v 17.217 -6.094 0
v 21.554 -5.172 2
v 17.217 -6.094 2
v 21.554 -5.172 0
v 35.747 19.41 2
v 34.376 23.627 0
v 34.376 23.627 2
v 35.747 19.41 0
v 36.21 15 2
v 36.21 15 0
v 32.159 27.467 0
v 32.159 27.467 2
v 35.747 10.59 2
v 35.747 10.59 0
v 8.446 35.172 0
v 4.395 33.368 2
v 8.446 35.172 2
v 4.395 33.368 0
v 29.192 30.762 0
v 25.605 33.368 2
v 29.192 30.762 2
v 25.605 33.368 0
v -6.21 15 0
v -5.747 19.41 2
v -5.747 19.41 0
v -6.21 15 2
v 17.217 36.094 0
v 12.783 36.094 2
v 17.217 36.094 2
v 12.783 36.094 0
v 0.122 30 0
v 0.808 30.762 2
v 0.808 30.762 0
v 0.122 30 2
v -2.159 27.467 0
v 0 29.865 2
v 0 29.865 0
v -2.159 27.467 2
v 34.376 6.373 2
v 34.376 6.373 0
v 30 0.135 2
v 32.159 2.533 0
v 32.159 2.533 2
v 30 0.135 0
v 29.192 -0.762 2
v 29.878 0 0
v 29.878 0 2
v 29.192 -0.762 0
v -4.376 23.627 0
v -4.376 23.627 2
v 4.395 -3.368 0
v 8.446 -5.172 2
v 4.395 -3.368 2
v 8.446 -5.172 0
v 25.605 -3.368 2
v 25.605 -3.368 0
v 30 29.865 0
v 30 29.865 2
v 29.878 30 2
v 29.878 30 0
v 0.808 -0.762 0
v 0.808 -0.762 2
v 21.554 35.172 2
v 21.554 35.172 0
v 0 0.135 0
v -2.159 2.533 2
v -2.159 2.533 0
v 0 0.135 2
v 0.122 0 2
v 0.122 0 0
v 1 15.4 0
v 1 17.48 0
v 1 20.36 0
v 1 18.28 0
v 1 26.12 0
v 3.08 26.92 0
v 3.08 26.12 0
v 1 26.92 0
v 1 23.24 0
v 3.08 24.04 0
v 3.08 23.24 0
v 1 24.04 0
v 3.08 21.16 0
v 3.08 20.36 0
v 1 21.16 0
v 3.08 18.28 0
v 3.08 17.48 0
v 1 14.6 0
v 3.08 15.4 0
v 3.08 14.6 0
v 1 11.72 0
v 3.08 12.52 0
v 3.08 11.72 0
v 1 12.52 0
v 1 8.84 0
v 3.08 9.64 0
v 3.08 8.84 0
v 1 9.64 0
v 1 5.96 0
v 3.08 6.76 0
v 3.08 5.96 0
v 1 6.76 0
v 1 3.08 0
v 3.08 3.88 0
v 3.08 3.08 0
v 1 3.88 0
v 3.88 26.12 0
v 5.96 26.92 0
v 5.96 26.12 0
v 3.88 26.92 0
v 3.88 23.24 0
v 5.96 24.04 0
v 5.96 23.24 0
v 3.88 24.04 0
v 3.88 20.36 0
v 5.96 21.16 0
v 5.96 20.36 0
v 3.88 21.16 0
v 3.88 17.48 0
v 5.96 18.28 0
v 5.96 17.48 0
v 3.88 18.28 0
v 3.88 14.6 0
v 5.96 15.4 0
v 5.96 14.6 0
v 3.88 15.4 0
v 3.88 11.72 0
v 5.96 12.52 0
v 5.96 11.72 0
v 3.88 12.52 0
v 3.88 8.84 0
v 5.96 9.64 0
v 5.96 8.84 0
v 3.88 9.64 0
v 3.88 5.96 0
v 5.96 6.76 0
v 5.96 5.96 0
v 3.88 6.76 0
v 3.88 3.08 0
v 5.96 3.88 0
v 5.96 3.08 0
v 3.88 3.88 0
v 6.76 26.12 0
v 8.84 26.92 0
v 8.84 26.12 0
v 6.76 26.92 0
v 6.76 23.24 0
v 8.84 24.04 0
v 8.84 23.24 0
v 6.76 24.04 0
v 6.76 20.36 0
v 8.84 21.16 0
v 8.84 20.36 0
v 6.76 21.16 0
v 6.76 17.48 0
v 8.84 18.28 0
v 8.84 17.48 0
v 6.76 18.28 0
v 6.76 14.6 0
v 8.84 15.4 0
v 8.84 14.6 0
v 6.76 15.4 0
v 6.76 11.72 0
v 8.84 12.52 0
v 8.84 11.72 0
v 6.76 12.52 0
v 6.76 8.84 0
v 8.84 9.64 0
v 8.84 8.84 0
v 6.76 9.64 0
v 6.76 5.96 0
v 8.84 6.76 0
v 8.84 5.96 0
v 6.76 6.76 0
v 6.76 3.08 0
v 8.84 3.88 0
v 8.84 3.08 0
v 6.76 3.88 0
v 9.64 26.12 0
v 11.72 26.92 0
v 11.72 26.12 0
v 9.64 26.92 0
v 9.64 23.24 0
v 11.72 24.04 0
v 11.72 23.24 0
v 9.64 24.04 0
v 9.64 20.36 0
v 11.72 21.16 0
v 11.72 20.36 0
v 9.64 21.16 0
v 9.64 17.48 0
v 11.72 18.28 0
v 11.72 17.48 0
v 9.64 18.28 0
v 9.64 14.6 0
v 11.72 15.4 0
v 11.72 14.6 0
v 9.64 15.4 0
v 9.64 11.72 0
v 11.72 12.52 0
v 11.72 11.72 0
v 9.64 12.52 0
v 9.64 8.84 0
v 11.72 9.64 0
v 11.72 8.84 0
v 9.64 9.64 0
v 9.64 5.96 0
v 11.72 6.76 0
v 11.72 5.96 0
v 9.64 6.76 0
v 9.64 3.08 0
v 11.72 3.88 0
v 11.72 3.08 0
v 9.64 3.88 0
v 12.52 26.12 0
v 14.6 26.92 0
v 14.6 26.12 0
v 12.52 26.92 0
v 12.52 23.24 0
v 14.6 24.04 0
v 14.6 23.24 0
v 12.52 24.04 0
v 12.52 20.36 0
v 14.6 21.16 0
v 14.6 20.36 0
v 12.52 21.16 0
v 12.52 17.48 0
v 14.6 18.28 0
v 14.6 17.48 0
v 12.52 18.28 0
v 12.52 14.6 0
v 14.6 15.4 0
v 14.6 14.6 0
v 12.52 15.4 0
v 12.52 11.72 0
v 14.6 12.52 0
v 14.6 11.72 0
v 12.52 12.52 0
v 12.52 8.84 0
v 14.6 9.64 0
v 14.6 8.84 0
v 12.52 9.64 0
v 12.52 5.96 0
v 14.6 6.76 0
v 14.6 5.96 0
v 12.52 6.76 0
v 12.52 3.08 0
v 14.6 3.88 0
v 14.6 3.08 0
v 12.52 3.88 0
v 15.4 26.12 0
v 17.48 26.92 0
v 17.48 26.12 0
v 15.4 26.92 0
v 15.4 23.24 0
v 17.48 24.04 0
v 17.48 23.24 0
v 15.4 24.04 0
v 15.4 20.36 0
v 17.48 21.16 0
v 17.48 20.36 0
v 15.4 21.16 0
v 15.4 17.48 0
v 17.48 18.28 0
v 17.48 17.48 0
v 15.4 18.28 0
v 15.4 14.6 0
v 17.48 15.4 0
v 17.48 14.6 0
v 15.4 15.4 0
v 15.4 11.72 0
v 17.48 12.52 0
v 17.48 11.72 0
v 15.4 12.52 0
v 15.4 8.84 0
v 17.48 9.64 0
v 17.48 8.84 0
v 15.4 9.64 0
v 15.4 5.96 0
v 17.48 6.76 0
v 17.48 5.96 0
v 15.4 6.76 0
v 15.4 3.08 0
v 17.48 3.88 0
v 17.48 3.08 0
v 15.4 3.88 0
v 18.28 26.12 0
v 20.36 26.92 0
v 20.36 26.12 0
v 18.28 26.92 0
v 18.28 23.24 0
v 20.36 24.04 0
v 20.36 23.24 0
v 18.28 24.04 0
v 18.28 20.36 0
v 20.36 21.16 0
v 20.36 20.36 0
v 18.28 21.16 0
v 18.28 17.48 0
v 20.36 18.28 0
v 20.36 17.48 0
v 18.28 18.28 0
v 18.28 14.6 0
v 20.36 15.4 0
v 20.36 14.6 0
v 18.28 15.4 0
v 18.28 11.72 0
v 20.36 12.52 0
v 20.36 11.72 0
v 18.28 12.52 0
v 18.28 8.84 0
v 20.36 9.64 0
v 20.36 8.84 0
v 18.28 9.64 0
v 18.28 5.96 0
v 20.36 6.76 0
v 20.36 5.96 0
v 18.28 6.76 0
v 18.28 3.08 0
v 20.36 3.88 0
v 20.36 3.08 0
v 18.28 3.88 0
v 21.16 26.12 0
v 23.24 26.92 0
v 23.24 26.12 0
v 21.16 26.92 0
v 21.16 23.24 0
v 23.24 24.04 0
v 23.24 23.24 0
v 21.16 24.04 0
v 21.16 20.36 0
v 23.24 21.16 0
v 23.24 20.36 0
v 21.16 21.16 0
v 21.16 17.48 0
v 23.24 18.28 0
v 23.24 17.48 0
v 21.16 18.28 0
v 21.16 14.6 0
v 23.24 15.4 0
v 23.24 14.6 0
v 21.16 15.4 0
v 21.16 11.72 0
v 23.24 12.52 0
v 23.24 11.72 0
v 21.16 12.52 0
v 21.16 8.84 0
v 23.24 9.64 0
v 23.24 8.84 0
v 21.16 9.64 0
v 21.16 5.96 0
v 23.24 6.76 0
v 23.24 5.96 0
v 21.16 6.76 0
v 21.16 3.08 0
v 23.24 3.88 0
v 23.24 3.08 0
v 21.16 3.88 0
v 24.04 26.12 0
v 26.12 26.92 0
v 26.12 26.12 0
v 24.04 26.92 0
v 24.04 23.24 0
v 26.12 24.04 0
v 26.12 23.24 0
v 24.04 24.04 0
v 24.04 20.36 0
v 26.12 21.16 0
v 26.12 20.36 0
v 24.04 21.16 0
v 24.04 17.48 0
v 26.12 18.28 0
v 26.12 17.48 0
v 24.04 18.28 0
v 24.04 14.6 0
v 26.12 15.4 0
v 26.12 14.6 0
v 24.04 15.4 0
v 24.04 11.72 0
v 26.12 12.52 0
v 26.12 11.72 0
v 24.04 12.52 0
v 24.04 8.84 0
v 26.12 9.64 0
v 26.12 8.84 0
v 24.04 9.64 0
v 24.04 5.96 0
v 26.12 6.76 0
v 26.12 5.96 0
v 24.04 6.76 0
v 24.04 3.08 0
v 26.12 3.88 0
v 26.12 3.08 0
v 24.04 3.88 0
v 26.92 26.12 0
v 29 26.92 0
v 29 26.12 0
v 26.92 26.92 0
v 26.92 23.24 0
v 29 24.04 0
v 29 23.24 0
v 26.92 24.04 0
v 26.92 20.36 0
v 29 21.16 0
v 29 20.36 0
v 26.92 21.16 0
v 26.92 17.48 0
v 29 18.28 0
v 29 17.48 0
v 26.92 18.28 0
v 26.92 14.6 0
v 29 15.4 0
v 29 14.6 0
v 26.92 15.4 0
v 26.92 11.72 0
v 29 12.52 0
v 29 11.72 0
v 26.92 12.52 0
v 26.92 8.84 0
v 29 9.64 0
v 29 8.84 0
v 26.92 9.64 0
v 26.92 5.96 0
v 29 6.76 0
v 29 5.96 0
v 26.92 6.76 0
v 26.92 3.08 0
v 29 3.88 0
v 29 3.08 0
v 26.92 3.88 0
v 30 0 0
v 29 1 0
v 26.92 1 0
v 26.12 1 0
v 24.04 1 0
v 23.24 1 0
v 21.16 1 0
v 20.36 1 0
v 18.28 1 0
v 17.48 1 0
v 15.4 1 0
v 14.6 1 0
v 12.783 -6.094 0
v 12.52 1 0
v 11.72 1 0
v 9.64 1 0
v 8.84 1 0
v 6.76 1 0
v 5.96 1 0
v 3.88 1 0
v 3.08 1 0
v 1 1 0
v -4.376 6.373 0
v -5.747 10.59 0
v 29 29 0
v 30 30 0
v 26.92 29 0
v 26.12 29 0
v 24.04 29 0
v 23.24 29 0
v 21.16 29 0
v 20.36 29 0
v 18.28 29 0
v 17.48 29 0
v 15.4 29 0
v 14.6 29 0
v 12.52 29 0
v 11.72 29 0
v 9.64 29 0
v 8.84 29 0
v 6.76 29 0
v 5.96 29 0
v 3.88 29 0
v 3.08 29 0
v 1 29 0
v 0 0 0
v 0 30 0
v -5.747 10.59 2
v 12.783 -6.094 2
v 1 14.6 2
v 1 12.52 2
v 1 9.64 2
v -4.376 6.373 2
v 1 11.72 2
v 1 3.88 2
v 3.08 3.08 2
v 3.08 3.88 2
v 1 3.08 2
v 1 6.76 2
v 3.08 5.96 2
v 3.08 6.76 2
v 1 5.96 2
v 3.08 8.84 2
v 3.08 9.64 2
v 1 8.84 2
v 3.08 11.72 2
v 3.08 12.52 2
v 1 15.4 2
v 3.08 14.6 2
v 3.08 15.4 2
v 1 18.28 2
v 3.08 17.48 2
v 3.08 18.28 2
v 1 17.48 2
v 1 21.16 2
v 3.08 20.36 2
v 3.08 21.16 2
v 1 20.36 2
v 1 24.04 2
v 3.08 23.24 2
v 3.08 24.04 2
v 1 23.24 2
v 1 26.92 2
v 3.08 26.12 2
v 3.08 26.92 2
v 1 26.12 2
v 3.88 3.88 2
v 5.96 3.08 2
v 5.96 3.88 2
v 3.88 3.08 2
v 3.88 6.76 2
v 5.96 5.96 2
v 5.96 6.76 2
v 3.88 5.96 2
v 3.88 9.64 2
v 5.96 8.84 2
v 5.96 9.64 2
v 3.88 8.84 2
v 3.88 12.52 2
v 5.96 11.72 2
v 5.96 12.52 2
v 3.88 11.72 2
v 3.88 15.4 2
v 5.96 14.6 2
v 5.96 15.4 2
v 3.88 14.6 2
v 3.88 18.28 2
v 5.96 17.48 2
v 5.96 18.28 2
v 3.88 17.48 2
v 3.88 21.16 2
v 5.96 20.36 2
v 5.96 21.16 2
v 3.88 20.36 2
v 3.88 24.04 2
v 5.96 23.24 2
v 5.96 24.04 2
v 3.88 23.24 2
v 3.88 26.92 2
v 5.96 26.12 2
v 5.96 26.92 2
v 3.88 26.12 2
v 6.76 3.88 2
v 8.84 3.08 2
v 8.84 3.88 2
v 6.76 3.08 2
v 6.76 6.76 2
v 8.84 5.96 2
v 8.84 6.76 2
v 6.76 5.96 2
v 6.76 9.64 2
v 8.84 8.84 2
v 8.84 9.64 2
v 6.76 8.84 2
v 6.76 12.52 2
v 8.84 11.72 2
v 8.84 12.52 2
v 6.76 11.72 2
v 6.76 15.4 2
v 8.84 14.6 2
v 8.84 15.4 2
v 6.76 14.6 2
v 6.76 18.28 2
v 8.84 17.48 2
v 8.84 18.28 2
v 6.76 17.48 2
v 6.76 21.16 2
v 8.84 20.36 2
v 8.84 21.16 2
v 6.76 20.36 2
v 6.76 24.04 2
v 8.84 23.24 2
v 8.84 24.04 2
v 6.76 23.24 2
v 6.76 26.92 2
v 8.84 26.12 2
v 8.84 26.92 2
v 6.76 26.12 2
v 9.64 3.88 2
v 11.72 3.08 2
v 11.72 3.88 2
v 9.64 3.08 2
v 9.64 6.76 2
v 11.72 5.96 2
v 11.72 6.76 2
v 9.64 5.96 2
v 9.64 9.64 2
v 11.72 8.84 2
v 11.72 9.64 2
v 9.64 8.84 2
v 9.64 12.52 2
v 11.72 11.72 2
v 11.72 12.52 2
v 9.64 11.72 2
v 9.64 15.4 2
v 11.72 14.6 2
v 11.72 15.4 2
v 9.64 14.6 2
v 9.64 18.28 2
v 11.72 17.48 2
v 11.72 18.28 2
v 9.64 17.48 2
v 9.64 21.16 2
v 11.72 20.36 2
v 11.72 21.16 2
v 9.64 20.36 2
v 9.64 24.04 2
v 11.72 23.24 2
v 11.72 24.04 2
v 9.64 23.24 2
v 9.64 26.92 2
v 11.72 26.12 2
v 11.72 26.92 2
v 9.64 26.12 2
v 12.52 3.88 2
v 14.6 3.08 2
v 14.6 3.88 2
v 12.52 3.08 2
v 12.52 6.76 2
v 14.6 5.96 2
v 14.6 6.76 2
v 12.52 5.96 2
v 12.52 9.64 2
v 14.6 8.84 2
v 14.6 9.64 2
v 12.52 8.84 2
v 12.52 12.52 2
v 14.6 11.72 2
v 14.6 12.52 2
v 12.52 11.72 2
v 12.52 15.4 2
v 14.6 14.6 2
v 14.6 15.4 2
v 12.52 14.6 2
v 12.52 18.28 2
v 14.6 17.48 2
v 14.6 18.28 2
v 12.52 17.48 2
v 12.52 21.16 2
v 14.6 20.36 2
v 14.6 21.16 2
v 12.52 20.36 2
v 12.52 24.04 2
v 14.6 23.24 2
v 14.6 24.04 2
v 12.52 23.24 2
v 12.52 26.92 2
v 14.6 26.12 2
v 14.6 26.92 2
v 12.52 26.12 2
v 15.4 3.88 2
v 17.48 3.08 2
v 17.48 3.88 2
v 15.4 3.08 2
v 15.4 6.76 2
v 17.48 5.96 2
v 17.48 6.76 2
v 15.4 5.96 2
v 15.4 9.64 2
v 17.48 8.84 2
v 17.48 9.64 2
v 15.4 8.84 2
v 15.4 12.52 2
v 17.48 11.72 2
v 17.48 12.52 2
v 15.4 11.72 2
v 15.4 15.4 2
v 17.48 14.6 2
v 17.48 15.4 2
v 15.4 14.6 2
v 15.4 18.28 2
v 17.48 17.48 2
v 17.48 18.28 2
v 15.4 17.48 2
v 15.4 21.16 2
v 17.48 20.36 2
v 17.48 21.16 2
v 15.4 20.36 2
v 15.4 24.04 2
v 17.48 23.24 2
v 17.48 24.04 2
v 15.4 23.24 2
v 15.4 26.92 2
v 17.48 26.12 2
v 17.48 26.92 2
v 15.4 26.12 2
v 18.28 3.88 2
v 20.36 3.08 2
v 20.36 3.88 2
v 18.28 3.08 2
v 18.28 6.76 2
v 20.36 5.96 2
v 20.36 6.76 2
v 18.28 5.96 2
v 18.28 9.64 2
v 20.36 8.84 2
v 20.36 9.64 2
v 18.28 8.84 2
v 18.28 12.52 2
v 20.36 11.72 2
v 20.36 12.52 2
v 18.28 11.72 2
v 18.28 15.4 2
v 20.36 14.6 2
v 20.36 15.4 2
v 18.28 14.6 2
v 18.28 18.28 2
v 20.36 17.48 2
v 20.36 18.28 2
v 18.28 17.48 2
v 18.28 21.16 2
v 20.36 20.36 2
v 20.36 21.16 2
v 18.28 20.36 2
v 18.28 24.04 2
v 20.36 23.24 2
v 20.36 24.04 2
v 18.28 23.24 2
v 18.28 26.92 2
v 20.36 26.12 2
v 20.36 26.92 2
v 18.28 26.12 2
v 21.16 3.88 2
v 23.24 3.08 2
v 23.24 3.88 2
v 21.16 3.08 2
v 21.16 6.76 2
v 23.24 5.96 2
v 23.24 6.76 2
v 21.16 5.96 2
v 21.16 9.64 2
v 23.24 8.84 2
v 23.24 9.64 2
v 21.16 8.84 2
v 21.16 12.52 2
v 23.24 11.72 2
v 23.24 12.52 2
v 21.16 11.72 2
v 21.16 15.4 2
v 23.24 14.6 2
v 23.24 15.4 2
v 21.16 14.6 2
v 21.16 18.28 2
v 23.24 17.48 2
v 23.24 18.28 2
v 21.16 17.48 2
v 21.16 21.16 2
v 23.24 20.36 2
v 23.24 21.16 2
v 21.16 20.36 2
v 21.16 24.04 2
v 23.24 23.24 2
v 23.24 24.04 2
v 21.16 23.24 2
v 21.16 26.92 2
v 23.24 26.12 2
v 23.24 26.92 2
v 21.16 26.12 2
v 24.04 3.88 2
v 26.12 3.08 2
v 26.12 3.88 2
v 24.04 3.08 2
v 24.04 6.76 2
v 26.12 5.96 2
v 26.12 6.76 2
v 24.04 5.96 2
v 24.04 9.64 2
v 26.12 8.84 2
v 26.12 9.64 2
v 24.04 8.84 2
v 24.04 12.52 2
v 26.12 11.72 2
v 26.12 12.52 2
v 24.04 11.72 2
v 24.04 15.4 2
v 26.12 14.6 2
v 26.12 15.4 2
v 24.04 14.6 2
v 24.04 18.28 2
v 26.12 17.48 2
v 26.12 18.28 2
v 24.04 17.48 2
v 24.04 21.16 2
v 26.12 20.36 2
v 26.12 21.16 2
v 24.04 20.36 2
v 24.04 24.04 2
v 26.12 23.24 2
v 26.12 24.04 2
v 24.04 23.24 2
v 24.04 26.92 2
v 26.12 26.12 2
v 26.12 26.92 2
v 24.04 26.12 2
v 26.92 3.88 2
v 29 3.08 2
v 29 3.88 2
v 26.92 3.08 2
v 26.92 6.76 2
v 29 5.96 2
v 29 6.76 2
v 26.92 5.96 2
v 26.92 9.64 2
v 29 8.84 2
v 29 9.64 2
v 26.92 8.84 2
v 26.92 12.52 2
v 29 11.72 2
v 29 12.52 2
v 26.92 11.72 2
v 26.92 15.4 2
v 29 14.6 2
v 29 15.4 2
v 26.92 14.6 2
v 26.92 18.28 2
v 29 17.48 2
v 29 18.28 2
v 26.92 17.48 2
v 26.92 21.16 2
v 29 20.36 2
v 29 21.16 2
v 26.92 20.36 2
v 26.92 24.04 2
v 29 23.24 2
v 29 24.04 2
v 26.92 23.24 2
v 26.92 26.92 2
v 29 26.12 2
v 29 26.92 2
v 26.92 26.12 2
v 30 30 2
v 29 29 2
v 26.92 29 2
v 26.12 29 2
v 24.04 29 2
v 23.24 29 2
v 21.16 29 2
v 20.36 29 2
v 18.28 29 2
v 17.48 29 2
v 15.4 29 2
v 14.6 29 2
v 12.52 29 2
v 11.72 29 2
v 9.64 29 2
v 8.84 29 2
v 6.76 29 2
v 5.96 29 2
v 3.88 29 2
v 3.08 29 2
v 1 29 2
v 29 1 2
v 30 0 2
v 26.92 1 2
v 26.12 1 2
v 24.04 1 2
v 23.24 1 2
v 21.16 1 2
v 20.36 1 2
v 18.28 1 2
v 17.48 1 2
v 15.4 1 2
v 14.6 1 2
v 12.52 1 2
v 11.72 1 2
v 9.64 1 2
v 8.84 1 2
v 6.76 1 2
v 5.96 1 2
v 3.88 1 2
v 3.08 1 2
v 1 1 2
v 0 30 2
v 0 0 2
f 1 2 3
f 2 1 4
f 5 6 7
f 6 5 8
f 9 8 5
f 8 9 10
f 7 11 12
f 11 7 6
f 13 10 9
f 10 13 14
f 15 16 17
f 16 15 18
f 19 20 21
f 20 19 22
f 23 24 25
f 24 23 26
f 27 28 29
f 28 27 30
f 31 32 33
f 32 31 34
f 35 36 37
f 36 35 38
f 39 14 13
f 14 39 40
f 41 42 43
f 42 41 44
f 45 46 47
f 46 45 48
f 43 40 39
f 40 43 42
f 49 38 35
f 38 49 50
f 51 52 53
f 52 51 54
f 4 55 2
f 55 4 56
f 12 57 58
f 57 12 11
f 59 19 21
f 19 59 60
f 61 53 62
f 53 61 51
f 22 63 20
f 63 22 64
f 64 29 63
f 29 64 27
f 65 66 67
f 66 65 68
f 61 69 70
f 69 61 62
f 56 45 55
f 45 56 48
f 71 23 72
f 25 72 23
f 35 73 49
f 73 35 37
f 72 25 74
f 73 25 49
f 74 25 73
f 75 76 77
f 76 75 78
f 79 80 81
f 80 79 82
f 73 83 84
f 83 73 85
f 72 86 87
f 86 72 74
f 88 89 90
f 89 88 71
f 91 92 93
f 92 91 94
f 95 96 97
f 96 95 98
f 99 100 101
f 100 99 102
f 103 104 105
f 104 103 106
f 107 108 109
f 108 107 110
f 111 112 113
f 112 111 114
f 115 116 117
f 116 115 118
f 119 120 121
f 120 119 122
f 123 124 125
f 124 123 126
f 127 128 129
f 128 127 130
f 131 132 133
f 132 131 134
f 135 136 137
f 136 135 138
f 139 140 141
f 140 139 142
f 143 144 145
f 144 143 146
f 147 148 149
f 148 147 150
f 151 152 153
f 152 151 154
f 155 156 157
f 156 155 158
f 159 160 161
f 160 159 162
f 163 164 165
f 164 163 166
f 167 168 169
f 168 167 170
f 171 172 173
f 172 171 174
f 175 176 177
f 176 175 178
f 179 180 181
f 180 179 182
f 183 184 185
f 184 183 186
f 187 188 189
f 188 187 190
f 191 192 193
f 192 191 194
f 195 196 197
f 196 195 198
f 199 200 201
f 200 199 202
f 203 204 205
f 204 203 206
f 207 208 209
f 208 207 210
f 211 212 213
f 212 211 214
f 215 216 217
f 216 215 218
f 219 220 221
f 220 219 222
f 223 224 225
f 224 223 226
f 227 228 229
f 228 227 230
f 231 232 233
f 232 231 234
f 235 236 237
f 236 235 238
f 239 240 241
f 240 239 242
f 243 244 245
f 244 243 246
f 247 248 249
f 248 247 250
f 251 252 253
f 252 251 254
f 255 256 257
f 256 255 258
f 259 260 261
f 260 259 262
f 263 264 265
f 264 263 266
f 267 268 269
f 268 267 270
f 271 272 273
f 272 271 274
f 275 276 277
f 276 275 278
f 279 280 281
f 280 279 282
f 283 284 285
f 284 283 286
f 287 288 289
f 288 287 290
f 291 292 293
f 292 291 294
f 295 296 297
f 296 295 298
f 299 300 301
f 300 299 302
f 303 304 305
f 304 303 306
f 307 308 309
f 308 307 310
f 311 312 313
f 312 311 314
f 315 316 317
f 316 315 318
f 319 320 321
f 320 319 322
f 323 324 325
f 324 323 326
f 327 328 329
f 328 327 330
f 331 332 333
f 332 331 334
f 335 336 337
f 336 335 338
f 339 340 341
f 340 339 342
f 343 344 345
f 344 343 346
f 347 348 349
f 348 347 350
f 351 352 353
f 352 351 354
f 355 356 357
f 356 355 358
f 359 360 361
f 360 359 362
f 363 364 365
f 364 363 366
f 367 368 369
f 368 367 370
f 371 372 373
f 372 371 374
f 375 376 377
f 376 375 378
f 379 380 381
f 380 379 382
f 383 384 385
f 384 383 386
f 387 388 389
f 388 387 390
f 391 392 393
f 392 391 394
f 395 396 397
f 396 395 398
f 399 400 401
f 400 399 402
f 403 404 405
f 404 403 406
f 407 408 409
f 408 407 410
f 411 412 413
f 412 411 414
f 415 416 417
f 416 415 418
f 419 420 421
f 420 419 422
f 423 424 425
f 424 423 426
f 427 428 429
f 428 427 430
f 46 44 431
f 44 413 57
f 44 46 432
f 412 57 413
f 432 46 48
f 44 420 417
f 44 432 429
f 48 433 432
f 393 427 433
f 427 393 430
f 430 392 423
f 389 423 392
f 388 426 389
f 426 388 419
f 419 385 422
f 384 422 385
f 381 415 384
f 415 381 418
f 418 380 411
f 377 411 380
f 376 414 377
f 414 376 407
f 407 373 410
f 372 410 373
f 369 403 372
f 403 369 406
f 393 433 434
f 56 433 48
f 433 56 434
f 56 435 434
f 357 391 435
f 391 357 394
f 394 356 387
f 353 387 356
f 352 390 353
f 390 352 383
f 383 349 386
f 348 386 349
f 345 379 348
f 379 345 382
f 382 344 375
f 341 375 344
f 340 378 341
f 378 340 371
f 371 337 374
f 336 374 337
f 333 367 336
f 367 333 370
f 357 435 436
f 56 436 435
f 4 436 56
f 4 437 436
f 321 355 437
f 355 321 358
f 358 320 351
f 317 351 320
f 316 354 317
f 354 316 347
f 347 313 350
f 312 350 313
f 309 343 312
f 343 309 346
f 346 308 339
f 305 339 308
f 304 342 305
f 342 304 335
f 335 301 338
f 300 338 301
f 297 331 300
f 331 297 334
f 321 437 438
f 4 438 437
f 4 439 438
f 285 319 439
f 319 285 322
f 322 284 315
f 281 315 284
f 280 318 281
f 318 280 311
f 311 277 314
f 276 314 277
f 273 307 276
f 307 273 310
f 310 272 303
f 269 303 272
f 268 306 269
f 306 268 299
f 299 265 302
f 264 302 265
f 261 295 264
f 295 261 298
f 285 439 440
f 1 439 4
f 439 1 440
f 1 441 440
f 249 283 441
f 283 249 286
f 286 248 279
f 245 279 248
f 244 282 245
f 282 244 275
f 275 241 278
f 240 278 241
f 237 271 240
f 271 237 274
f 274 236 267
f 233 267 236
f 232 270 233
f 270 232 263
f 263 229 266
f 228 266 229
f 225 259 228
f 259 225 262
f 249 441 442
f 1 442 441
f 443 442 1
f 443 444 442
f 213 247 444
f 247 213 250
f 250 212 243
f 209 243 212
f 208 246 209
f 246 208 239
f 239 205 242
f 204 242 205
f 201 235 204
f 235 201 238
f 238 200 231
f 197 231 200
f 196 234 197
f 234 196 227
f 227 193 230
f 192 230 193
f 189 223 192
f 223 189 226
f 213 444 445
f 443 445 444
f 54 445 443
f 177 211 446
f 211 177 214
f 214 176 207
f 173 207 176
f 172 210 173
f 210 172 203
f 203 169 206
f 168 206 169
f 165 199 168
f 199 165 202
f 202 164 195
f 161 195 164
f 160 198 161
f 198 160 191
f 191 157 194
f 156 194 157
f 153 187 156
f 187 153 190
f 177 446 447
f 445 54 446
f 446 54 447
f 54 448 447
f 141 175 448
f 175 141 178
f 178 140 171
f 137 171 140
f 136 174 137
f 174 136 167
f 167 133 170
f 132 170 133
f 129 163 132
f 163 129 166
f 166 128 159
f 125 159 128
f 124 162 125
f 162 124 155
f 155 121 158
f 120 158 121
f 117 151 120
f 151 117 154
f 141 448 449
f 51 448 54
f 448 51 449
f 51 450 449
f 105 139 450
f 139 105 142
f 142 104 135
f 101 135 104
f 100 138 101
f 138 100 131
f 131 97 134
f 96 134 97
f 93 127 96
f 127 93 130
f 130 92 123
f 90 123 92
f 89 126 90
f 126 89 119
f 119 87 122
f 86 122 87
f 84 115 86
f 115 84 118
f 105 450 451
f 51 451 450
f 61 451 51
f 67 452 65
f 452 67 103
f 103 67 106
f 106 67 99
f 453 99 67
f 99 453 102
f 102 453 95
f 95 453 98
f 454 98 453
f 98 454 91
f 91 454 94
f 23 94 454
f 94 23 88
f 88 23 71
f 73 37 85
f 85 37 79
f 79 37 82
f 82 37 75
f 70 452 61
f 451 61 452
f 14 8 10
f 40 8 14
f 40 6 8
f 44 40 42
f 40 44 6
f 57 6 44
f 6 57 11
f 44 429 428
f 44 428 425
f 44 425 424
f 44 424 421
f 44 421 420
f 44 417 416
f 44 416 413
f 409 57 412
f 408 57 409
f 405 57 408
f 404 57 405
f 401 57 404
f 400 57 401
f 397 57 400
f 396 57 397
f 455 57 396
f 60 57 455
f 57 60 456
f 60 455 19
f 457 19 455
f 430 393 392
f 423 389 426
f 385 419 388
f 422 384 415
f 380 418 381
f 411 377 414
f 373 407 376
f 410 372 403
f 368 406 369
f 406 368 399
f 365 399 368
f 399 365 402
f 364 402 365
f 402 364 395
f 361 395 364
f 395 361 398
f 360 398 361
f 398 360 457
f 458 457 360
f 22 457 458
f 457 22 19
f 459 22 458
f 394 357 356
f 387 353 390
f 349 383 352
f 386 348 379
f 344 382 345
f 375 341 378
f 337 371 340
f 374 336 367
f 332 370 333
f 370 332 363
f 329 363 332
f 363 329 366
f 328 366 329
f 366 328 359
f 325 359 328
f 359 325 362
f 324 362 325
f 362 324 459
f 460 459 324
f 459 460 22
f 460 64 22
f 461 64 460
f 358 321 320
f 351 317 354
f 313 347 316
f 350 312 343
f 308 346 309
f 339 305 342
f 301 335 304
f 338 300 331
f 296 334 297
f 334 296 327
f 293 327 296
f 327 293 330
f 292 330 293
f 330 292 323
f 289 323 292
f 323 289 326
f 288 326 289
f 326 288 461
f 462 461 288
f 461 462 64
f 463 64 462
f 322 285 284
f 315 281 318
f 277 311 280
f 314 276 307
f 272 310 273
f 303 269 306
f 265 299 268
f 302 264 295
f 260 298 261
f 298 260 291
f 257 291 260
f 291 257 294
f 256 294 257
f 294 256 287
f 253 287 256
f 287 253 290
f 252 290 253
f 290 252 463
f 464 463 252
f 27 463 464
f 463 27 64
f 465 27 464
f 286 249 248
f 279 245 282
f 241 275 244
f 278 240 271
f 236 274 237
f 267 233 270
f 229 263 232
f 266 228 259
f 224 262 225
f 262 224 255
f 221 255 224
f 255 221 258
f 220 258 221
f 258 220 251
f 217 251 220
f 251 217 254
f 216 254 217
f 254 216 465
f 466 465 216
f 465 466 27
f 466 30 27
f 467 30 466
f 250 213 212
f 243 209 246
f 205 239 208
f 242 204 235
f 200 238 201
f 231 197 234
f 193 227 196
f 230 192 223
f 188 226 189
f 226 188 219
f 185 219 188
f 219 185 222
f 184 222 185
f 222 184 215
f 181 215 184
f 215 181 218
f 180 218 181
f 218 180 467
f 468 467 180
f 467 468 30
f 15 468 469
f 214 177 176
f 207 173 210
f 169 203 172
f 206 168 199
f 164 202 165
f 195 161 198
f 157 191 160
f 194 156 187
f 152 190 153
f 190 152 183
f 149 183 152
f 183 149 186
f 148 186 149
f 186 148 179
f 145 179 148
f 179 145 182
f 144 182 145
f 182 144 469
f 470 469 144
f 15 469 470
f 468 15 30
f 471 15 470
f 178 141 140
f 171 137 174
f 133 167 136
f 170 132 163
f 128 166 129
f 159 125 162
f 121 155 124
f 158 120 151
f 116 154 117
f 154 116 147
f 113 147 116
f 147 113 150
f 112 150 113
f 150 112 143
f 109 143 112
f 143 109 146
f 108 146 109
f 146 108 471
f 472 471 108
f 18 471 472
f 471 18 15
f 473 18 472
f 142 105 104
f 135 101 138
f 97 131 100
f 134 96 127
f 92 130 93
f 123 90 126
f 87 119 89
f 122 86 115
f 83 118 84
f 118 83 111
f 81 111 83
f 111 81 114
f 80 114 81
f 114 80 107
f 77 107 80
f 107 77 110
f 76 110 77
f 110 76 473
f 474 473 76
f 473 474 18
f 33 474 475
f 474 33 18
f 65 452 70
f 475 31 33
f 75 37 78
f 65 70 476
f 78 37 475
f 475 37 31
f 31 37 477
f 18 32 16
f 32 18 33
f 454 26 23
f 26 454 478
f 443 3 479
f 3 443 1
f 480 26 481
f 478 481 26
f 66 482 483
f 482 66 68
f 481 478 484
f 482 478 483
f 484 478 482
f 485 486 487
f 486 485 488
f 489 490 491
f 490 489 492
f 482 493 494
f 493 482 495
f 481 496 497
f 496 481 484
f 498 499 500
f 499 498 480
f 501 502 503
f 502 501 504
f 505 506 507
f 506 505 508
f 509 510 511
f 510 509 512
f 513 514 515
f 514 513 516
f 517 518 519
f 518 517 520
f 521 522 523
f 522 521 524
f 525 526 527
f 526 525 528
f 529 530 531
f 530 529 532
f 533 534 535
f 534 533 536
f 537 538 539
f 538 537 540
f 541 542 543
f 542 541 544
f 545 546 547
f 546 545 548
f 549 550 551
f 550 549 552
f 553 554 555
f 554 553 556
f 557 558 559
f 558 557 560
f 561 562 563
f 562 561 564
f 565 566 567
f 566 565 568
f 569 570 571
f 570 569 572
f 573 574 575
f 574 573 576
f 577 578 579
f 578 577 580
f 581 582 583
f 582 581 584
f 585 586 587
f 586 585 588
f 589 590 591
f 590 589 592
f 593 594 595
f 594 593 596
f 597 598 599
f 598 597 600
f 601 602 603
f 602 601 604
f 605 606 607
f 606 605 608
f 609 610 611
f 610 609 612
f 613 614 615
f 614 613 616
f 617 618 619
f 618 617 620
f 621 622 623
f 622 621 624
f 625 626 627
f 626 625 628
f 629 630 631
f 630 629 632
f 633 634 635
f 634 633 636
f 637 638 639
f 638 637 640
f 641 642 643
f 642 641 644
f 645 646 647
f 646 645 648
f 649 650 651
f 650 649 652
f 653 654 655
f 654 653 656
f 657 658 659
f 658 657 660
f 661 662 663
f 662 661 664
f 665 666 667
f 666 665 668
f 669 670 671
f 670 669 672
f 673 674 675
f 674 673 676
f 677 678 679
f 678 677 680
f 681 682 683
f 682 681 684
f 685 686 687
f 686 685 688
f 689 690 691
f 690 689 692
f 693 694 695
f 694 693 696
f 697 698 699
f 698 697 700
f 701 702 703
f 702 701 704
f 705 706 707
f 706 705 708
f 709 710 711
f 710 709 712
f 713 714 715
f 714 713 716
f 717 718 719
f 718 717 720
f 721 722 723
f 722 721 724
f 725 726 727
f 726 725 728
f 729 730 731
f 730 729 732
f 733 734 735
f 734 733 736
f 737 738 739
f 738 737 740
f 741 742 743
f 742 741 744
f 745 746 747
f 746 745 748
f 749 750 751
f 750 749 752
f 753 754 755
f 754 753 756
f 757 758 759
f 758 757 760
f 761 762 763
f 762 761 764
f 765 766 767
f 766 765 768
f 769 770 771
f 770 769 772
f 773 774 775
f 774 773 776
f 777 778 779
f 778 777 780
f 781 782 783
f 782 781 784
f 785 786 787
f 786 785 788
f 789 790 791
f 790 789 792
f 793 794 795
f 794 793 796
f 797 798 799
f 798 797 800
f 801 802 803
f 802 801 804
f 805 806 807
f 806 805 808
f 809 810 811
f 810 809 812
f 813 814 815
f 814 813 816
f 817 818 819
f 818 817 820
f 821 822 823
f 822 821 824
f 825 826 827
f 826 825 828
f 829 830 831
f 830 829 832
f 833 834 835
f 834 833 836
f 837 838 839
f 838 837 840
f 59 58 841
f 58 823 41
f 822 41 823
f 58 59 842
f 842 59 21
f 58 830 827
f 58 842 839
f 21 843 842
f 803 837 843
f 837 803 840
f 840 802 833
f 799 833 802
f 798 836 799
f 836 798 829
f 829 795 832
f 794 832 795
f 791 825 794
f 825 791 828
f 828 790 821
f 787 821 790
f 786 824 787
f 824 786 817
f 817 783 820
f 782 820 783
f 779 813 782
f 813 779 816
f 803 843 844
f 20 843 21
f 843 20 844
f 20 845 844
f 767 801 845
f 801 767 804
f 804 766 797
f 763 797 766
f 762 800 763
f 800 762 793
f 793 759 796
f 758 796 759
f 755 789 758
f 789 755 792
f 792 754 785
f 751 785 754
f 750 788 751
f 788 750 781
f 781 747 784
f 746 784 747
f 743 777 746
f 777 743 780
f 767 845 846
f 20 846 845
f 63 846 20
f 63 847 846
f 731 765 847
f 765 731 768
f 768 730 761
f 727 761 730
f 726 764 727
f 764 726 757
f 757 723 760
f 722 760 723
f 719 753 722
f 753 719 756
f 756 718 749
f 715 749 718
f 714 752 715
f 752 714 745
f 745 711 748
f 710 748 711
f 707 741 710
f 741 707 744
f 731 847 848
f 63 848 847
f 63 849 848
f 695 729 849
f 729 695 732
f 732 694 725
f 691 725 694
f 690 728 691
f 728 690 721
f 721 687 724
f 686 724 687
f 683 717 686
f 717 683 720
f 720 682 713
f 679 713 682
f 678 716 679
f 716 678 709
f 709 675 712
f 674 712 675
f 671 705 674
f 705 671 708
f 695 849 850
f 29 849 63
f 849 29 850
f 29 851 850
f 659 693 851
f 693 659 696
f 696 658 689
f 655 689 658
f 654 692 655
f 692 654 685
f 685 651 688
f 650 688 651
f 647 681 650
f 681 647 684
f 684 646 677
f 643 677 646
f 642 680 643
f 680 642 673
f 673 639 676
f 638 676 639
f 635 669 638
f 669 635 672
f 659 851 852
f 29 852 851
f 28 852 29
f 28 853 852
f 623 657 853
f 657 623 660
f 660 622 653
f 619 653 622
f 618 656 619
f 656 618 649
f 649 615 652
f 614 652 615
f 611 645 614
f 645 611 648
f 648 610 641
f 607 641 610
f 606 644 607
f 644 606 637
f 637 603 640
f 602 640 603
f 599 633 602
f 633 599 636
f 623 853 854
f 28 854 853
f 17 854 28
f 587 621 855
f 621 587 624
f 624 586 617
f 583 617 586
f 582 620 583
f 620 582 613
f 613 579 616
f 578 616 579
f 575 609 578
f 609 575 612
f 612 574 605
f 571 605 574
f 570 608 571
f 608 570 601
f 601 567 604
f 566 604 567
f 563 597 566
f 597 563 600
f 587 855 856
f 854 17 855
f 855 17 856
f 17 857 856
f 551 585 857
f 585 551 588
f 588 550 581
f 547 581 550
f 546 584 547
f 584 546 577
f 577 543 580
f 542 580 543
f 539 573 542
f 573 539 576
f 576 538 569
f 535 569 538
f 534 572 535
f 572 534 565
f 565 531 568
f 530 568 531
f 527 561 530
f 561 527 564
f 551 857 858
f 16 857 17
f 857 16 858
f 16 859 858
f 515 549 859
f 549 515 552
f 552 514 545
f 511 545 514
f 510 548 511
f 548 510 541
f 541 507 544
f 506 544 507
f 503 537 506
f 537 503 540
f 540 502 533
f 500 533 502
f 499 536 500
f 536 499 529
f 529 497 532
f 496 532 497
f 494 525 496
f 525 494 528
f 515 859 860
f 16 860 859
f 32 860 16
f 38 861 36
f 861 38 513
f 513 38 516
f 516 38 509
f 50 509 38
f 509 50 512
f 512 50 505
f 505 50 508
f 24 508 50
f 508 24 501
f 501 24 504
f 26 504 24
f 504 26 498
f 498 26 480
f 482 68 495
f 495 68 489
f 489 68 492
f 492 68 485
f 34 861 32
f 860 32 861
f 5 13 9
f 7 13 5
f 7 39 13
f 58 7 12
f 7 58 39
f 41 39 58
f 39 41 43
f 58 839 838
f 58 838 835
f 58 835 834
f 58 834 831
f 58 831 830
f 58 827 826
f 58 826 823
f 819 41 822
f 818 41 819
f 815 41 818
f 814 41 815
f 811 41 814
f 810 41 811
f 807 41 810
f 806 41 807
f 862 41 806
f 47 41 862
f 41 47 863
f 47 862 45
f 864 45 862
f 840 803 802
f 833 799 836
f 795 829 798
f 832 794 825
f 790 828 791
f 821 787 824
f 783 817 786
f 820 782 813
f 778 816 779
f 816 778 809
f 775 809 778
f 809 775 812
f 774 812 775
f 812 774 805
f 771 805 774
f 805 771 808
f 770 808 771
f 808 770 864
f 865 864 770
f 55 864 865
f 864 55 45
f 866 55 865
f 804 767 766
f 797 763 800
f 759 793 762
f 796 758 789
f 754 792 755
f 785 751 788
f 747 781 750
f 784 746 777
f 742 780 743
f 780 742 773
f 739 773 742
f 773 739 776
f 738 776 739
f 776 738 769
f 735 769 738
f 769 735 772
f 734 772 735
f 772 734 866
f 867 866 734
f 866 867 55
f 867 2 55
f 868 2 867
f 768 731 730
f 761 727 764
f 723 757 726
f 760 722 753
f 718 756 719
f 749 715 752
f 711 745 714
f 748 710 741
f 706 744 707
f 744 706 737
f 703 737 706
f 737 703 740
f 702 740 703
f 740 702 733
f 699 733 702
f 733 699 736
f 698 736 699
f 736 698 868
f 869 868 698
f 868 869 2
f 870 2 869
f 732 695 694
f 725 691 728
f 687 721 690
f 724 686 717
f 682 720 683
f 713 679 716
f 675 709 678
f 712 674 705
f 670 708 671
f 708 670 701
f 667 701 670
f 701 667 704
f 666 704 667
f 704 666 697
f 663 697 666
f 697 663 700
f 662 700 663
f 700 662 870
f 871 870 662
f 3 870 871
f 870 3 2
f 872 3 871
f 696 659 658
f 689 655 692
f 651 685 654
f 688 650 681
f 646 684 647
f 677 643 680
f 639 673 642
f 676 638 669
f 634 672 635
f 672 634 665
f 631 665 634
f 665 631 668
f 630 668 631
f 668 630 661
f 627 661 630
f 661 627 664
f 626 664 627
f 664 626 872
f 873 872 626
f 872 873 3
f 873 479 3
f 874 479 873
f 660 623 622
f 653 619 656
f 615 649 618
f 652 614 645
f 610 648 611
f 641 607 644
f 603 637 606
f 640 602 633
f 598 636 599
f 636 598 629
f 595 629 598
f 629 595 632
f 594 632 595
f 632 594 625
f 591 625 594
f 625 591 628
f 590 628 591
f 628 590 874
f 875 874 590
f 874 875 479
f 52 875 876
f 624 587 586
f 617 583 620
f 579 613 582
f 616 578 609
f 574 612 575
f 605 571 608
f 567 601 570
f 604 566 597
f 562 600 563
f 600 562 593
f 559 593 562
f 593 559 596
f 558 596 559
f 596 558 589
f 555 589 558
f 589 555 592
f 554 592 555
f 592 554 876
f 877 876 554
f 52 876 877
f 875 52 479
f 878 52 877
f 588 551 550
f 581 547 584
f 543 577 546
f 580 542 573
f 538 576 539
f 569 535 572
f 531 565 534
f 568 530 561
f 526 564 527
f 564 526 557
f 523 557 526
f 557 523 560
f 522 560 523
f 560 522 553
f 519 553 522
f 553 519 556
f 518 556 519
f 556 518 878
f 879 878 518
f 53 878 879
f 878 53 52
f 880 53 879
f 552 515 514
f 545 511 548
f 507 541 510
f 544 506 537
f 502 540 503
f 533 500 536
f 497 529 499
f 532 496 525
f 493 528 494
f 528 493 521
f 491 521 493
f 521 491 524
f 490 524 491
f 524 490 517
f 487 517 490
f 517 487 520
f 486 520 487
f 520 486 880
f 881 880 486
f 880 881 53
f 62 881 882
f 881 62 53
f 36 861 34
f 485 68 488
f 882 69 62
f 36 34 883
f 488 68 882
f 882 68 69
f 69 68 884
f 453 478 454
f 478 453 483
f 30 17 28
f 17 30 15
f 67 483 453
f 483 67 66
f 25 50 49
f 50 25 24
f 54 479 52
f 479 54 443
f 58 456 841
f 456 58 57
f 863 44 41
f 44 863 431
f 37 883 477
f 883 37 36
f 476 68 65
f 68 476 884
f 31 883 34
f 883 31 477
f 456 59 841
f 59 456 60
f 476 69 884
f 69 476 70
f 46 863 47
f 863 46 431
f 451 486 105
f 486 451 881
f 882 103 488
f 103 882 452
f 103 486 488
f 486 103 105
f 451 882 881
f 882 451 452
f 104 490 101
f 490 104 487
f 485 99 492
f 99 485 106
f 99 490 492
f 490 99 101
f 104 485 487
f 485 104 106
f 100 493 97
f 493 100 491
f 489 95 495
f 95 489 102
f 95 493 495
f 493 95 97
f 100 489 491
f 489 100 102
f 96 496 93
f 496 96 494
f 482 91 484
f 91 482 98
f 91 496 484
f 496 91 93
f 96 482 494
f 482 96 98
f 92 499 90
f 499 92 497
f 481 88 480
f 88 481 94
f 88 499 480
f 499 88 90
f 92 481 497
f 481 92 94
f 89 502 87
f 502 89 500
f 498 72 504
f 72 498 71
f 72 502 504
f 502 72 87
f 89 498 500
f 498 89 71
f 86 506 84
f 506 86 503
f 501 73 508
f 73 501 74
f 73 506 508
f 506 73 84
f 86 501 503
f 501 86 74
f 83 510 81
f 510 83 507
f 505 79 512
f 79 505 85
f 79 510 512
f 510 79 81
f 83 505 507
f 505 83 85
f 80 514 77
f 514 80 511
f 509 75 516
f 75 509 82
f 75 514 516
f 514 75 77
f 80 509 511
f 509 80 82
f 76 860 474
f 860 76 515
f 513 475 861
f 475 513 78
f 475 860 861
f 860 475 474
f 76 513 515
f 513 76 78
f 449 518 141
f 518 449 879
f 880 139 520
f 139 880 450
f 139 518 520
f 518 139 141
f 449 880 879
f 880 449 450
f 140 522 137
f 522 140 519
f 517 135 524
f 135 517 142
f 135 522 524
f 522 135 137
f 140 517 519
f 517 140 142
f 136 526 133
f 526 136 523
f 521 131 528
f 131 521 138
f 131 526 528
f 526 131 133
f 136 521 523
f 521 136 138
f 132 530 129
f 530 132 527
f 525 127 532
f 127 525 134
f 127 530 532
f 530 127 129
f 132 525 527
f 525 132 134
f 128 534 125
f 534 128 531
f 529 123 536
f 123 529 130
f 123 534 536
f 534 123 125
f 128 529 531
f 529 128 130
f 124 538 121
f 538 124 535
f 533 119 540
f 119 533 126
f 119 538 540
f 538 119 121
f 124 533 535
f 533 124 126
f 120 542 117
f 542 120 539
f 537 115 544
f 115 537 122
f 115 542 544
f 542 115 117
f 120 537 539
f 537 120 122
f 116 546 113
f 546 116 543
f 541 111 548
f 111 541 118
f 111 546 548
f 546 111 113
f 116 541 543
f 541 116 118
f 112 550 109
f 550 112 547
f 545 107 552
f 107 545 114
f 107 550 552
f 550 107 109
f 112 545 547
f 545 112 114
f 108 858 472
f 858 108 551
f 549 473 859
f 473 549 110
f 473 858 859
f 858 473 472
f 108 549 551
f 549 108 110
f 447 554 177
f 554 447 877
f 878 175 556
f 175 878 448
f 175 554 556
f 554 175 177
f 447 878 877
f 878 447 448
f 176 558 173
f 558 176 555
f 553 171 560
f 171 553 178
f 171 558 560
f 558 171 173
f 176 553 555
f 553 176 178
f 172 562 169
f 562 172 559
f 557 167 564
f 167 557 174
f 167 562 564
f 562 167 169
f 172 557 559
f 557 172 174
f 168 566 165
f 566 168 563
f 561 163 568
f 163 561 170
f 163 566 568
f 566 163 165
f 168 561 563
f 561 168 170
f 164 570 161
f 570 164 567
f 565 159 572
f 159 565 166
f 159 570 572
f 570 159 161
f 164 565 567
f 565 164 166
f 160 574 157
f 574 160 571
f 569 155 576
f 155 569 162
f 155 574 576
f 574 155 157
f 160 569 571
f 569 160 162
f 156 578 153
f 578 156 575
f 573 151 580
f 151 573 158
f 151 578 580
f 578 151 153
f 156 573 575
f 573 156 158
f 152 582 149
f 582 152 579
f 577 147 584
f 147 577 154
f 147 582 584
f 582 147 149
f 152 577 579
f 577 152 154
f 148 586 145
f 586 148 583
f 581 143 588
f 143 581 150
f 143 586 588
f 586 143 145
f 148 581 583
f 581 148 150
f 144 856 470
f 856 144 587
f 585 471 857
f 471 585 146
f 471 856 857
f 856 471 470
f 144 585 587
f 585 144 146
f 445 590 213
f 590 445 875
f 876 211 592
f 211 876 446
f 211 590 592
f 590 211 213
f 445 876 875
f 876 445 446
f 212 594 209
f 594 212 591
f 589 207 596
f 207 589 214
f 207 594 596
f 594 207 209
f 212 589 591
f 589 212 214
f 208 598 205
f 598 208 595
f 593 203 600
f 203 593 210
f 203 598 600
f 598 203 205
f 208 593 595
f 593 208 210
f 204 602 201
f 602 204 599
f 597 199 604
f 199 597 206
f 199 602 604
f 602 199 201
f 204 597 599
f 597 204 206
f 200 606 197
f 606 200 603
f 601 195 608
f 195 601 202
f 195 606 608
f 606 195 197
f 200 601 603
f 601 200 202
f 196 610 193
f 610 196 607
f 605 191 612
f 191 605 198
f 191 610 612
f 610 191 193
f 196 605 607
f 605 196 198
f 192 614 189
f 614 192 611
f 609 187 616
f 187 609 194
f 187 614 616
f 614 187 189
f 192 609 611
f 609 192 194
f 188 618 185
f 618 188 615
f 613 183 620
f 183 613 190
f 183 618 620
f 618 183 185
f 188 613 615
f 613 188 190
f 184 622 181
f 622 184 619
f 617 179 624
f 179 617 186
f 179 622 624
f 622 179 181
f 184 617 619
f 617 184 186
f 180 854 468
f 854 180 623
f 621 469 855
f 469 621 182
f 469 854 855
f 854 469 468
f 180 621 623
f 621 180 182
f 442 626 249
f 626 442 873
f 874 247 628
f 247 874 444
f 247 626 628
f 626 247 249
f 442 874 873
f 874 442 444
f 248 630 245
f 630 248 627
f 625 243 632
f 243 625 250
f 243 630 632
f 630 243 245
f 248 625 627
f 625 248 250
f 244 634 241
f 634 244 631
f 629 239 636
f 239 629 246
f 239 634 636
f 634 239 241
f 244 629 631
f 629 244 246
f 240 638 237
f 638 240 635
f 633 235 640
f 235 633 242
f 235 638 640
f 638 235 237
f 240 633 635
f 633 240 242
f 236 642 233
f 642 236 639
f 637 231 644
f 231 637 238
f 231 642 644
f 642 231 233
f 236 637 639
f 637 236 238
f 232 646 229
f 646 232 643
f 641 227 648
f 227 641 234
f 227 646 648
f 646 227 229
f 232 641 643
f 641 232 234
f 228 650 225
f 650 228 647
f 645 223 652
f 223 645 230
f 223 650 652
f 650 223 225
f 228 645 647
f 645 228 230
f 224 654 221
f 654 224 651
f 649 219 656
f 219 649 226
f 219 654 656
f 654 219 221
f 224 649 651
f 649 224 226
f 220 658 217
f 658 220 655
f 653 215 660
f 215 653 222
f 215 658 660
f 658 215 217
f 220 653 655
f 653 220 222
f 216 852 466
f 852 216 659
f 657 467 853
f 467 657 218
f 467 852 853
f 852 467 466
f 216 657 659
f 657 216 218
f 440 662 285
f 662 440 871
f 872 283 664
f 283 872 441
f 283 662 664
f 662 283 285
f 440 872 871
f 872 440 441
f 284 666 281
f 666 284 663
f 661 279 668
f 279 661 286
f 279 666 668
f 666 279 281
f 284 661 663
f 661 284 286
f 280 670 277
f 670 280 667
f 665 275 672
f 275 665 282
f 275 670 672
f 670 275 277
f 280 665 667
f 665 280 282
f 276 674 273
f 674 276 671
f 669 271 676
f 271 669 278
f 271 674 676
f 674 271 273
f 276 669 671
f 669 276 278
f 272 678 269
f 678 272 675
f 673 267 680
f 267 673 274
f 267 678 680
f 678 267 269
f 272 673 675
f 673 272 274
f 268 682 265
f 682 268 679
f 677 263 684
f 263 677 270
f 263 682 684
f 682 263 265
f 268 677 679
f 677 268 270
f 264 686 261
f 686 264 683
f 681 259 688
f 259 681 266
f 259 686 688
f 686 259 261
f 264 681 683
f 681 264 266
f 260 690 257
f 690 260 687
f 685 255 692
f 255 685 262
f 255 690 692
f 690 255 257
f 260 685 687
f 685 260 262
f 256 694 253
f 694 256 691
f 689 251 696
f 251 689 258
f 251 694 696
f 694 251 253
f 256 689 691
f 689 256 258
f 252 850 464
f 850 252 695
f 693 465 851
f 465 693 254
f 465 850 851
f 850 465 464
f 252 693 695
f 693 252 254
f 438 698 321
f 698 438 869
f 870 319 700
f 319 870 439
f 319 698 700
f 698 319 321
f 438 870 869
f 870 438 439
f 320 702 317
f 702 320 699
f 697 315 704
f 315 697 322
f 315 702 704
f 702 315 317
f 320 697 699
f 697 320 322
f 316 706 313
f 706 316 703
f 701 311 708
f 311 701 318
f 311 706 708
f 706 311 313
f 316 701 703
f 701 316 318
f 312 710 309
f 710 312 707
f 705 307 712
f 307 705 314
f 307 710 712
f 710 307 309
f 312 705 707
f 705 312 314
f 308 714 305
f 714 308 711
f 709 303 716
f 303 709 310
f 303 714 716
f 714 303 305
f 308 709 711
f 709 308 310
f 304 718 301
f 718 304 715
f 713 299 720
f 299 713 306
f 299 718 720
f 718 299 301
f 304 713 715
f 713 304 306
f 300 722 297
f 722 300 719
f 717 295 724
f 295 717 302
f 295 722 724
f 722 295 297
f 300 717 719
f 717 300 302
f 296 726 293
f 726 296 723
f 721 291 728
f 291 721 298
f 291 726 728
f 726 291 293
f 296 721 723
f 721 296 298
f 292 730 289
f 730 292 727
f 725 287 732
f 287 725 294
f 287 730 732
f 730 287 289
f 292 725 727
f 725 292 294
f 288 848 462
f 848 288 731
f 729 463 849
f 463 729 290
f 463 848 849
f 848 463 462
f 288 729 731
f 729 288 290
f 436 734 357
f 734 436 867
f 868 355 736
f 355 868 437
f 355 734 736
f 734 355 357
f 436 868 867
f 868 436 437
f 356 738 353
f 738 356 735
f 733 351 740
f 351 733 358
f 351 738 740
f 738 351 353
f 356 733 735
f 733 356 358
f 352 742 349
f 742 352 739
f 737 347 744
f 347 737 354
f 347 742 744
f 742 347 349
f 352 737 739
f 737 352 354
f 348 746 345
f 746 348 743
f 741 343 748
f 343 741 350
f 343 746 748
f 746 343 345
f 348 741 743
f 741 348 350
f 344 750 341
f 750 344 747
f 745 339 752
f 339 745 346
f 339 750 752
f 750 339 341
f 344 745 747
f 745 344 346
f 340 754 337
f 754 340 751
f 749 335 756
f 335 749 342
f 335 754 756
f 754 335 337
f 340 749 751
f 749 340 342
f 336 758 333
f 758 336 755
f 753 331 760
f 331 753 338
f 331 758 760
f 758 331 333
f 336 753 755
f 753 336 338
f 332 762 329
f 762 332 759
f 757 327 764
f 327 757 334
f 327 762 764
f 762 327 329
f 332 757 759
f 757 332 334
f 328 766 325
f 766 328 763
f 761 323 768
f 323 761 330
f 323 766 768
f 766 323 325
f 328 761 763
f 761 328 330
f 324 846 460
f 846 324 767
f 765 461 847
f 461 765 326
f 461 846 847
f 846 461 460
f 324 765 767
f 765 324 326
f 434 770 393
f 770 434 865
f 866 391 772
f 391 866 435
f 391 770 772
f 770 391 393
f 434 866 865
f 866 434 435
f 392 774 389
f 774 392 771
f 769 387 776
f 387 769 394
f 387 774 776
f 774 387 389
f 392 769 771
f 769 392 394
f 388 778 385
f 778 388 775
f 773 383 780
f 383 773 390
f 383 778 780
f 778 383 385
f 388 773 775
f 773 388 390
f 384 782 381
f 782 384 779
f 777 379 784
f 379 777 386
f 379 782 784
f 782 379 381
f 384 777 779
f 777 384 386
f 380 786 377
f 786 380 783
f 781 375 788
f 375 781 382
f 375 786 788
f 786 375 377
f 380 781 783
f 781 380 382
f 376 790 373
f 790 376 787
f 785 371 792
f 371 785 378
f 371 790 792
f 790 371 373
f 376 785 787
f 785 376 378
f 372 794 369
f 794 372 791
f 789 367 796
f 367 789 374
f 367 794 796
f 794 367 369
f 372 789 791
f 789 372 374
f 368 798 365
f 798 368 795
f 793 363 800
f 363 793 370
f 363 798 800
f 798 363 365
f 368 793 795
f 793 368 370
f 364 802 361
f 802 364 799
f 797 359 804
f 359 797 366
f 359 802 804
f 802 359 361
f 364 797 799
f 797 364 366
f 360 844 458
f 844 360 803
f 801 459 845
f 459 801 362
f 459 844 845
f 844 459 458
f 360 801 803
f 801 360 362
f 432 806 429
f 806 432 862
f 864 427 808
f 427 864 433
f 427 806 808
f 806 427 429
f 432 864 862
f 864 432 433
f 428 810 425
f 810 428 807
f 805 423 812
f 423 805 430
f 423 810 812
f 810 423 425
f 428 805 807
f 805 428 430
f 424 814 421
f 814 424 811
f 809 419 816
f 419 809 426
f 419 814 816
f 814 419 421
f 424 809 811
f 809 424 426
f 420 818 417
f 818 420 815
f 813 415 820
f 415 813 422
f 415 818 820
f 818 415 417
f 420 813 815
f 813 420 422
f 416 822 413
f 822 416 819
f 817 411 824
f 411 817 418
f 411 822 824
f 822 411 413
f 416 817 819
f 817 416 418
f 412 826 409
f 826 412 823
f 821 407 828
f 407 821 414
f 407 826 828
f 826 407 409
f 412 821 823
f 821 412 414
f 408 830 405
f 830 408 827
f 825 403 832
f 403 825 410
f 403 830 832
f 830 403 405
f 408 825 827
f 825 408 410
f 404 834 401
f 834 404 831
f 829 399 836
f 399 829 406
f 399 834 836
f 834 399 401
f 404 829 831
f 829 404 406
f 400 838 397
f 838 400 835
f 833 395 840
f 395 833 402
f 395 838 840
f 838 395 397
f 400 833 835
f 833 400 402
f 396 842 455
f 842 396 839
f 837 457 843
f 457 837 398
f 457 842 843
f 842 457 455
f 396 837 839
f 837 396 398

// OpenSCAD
// Grid
// By Dana Woodman <dana@danawoodman.com>


// Settings
//--------------------------

/* [Global] */

// The width of the exported file.
width = 30;

// The height of the exported file.
height = 30;

// The number of columns to generate.
cols = 10;

// The number of rows to generate.
rows = 10;

// The border around the grids/slats
border = 1;

// The spacing between rows/columns.
spacing = .8;

//thickness
thickness = 2;

/* [Hidden] */

// The magic...
//--------------------------

// Calculated inner width of dispaly area.
innerWidth = (width - (2 * border));
innerHeight = (height - (2 * border));
//echo("innerWidth", innerWidth, "innerHeight", innerHeight);

// Calculate size of the squares.
function dimension(size, divisions) = (size - ((divisions - 1) * spacing)) / divisions;
xWidth = dimension(innerWidth, cols);
yWidth = dimension(innerHeight, rows);
//echo("xWidth", xWidth, "yWidth", yWidth);

function calculate_location(size, index, spacing) = (size + spacing) * index;

eps=.001;
// Subtract the squares from the display area.
difference() {

	// The display area.
    union()
    {
        translate([width/2,height/2,0])
        cylinder(r=1.414*max(width,height)/2,h=thickness);
        cube(size=[width, height,thickness]);
    }
	// Offset by border size.
	translate([border, border,-eps])

		// Iterate over all the columns.
		for (col = [0 : cols - 1]) {
			
			// Iterate over all the rows.
			for (row = [0 : rows - 1]) {

				// Caclulate position of each square
				translate([
					calculate_location(xWidth, col, spacing), 
					calculate_location(yWidth, row, spacing)
				])
					cube(size=[xWidth, yWidth,2*thickness]);
			}
		}
}
